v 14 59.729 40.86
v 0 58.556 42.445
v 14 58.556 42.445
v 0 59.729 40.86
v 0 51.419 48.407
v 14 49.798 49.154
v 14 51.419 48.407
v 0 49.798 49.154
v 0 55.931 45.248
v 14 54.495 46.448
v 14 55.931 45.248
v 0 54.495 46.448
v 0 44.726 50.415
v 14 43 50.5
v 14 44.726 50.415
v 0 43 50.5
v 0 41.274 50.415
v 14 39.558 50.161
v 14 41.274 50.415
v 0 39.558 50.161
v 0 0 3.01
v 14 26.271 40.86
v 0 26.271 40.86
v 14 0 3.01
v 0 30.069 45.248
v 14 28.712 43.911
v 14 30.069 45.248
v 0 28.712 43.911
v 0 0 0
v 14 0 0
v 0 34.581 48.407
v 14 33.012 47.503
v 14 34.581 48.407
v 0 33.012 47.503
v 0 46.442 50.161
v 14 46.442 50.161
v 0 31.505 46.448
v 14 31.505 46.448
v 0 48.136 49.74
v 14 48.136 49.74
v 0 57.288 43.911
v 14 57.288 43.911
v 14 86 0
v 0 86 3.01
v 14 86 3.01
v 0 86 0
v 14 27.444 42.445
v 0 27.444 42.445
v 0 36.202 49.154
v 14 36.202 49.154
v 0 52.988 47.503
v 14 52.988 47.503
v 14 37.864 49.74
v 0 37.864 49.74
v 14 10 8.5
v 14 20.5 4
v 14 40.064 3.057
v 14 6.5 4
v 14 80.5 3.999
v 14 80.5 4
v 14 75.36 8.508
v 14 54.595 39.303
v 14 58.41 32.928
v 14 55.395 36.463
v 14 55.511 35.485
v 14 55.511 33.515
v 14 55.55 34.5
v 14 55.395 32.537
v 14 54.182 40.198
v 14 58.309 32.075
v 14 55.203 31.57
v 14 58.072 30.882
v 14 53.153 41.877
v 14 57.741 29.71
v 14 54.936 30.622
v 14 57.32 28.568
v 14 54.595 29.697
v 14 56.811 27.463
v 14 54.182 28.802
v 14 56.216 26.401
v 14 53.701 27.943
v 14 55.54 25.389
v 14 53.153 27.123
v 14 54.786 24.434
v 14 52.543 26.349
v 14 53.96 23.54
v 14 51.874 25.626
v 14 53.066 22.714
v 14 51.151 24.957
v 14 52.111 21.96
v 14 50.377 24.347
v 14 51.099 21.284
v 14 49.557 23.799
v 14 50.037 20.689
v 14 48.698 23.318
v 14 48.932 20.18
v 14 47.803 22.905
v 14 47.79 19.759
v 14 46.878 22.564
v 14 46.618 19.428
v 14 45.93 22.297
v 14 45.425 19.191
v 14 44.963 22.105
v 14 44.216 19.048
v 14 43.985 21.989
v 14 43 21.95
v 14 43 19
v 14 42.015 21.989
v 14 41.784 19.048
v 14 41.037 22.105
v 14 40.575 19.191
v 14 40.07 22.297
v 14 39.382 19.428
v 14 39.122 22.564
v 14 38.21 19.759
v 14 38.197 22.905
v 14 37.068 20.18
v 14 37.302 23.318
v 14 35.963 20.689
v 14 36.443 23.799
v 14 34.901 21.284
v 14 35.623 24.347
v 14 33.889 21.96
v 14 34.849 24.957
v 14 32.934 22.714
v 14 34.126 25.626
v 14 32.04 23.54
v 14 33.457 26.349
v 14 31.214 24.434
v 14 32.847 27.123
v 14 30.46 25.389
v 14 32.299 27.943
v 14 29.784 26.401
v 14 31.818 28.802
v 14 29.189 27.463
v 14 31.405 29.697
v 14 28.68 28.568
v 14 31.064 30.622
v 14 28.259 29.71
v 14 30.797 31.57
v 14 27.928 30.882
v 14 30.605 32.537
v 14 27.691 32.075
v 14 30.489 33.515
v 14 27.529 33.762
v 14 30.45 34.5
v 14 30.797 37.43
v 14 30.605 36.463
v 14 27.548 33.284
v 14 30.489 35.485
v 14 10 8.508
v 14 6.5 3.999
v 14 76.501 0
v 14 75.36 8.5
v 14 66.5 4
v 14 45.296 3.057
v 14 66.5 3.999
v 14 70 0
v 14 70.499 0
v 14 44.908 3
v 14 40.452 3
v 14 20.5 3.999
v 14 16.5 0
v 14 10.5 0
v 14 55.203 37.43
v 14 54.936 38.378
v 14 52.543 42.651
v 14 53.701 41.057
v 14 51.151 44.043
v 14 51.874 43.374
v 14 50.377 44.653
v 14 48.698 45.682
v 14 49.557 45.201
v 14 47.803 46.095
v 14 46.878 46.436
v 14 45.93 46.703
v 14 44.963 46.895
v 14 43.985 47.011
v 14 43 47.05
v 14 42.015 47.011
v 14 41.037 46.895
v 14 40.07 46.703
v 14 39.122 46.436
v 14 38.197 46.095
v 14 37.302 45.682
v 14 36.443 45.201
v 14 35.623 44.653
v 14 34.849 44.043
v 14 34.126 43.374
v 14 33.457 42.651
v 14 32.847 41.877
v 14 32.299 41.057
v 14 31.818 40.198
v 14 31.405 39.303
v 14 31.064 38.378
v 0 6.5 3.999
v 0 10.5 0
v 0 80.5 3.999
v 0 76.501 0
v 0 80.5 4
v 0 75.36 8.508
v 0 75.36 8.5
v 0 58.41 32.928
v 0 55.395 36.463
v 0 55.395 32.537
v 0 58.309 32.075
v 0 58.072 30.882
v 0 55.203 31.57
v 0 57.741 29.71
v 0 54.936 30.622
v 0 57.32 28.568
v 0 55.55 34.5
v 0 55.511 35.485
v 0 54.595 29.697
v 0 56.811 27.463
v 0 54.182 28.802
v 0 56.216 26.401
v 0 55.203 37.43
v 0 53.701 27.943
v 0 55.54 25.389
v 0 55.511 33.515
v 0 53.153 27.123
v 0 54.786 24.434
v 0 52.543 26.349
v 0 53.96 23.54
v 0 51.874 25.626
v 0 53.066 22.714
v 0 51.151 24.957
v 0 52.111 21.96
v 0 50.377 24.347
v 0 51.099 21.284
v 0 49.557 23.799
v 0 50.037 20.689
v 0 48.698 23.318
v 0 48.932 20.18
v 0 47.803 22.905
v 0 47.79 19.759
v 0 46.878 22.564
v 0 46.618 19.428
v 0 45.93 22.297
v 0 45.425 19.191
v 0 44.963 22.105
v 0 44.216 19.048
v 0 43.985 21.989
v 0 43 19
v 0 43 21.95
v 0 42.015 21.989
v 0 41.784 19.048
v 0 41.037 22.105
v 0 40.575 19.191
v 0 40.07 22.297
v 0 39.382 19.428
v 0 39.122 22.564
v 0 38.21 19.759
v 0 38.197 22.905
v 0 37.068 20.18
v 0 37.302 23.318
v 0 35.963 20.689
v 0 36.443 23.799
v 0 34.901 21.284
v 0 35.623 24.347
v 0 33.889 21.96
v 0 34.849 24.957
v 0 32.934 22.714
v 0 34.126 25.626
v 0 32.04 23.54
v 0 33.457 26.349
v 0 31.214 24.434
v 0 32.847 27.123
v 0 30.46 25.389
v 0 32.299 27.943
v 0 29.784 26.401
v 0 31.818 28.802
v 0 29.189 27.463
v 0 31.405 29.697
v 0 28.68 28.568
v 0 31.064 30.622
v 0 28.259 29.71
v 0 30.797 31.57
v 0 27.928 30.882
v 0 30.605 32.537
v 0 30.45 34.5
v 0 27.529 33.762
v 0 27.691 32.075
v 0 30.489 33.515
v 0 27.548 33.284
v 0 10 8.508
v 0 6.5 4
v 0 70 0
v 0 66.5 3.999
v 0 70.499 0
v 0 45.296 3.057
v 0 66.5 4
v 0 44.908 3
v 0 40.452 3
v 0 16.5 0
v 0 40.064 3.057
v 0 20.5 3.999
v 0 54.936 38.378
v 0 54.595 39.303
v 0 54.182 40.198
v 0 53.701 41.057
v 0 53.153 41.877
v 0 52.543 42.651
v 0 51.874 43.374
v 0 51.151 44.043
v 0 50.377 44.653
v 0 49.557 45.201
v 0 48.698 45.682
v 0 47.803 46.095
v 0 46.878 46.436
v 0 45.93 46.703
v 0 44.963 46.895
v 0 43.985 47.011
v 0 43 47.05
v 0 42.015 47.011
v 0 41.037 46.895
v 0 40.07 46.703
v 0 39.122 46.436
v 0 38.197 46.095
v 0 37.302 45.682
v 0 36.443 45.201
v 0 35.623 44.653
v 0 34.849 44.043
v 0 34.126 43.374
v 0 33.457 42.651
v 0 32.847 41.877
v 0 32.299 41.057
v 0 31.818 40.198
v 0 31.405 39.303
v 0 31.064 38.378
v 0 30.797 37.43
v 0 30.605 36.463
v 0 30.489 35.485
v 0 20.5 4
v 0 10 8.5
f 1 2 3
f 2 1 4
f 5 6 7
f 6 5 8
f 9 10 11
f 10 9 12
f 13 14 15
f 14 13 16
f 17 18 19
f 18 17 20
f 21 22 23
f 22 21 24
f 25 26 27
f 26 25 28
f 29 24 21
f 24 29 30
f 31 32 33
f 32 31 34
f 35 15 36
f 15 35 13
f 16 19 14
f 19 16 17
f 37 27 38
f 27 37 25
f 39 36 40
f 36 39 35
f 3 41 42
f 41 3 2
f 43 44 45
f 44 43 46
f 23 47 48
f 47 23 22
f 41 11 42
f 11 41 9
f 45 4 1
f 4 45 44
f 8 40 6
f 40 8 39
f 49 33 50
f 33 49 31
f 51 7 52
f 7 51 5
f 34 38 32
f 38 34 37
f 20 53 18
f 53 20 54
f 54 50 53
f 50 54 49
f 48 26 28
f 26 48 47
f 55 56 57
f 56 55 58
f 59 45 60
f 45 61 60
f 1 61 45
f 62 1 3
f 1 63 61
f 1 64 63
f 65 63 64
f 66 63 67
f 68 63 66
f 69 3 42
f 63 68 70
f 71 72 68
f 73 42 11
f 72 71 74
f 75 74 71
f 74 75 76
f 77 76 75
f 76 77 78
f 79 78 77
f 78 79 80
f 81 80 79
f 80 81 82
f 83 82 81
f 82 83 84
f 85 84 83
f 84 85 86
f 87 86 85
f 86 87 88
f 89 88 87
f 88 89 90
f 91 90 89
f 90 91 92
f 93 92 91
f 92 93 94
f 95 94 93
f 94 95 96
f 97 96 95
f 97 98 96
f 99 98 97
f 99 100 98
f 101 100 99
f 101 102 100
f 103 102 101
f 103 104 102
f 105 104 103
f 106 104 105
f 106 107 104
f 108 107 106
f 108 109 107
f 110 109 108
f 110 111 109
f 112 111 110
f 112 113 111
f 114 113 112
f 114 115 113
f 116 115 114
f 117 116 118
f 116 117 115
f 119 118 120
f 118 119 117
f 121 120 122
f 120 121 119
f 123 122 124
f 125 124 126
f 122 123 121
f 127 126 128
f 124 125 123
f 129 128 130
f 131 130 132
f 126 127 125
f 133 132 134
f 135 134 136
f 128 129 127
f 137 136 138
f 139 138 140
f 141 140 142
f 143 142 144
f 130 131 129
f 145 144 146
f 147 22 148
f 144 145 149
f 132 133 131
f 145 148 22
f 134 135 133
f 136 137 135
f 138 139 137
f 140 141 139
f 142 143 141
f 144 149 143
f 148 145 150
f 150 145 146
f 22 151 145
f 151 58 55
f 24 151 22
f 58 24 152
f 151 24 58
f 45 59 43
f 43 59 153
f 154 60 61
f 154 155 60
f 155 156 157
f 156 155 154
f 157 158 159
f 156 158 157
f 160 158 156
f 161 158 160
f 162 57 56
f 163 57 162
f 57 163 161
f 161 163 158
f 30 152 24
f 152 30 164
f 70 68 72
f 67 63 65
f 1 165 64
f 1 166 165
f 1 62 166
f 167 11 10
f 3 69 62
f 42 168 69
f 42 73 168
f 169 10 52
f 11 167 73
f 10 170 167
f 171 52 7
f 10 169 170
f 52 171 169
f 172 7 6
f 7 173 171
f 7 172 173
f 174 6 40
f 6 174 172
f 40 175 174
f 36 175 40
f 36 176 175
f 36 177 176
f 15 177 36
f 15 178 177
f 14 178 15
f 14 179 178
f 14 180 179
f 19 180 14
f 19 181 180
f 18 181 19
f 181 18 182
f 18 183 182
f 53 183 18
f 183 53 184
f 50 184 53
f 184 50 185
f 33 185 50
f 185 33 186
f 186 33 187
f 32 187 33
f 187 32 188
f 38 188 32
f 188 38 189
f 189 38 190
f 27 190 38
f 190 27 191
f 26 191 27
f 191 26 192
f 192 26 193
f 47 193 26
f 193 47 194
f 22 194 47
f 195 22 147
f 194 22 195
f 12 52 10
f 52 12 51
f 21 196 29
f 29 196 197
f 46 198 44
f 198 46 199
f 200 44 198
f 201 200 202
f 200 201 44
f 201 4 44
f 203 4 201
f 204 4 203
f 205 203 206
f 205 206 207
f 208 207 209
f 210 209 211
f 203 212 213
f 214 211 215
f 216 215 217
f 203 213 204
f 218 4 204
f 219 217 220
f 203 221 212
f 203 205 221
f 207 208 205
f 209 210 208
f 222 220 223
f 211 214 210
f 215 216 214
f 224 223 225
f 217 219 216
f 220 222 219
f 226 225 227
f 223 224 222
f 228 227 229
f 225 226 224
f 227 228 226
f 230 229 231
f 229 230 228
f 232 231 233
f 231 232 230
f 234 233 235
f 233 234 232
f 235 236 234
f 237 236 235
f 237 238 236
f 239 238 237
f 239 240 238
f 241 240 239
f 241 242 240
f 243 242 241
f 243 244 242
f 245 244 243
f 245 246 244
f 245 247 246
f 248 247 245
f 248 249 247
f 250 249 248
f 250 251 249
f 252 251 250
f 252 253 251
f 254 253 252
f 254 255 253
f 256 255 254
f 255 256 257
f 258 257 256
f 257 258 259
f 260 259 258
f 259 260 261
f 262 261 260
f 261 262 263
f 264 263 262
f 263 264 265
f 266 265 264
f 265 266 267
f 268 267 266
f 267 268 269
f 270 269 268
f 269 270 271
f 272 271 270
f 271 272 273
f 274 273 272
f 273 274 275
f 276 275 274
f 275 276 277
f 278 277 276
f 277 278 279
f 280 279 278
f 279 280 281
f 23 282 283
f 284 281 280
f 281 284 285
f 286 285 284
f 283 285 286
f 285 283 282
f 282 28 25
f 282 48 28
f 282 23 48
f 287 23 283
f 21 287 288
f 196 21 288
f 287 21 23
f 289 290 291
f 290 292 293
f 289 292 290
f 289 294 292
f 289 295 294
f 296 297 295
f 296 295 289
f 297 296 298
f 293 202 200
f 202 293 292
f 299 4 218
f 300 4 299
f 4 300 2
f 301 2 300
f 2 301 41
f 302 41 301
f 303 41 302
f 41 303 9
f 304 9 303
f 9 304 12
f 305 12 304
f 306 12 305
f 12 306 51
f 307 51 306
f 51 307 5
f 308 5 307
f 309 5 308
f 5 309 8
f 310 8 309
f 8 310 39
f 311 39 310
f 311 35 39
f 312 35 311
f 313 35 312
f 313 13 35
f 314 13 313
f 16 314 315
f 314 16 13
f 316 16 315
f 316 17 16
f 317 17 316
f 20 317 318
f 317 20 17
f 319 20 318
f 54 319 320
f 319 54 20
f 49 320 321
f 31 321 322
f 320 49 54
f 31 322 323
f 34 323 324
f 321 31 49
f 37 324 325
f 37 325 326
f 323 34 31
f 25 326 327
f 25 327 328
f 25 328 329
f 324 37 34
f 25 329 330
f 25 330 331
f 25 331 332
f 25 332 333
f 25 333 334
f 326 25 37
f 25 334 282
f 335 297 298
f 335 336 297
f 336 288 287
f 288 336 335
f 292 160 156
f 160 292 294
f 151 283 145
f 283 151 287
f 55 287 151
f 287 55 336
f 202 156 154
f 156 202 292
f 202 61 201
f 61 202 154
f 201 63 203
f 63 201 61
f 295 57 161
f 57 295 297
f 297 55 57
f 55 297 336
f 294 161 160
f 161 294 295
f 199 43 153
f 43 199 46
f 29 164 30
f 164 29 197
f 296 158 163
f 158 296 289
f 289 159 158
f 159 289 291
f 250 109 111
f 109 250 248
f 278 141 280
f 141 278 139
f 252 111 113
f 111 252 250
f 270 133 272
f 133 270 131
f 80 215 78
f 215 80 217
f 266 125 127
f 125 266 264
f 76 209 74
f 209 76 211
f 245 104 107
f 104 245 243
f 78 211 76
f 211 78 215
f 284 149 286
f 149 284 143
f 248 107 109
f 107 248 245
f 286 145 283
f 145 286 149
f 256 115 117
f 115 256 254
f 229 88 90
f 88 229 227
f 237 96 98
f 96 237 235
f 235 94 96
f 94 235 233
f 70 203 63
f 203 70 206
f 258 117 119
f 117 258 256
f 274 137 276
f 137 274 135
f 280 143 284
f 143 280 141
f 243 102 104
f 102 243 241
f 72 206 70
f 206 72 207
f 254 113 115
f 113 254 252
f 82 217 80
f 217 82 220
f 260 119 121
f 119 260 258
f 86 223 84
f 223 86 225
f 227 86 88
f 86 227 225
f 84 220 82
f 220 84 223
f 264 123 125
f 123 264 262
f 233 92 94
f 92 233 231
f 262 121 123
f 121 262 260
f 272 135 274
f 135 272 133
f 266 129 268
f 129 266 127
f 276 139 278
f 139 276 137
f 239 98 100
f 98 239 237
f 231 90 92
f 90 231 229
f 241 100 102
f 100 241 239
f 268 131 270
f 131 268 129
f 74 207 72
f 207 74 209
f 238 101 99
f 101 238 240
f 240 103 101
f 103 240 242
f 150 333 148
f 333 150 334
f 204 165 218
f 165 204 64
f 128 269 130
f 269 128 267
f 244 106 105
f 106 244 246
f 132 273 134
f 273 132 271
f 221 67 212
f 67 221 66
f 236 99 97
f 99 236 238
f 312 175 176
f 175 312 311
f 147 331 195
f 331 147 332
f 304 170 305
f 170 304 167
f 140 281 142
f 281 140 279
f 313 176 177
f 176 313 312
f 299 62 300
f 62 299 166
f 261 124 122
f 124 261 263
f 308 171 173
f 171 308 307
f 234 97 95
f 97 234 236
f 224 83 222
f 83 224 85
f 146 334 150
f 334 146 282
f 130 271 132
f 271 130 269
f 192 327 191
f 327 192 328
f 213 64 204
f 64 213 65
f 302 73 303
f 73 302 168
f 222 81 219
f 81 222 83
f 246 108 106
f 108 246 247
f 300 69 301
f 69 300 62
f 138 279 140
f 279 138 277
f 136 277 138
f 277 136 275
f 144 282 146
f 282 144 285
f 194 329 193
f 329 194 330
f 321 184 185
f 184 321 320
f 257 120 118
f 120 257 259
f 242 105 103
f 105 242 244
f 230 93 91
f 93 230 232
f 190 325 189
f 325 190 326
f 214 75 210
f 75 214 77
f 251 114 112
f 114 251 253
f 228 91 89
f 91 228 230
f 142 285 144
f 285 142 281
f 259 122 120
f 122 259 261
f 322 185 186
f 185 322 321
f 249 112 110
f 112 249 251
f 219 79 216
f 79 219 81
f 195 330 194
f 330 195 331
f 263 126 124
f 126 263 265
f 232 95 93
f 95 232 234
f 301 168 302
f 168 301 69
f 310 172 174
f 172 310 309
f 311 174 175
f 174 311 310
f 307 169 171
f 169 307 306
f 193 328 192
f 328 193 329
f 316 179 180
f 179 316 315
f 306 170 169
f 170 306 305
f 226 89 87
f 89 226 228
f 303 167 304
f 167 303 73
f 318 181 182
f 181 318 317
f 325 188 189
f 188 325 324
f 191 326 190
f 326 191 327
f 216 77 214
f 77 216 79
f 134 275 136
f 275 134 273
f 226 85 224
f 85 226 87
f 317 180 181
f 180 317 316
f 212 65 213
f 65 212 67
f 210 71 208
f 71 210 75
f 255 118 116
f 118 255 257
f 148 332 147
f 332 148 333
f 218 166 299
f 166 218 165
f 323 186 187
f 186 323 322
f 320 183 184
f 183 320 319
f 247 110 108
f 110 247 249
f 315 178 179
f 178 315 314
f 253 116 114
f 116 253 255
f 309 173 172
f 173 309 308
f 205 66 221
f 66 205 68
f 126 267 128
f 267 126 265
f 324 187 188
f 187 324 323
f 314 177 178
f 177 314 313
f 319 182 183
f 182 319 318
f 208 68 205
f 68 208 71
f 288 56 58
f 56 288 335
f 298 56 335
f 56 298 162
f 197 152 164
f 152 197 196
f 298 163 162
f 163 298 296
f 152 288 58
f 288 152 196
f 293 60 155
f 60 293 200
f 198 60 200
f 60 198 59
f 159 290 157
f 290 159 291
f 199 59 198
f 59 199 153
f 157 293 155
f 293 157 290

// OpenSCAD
$fn=80;

module pcTop() {
    cube([370,86,2]);
    
    translate([7,13.5,2]) cylinder(d=3.5,h=4);
    translate([7,13.5+60,2]) cylinder(d=3.5,h=4);
    
    translate([370-31,13.5,2]) cylinder(d=3.5,h=4);
    translate([370-31,13.5+60,2]) cylinder(d=3.5,h=4);
        
}

module tube() {
    translate([0,86/2,22+(25/2)]) rotate([0,90,0]) cylinder(d=25.1,h=345);
}

module handle() {
    module body() {
        hull() {
            cube([14,86,0.01]);
            translate([0,86/2,20]) rotate([0,90,0]) scale([1,0.8,1]) cylinder(d=55,h=14);
        }
    }
    
    module bodyFrame() {  
        cube([14,86,3]);
        
        translate([0,0,3]) difference() {
            body();
            translate([-0.01,10,5.5]) scale([1.01,0.76,0.76]) body();
        }
    }
    
    difference() {
        union() {
            bodyFrame();
            translate([0,86/2,22+(25/2)]) rotate([0,90,0]) cylinder(d=25+6,h=14);
        }
        
        translate([-0.001,0,0]) tube();
        
        translate([-10,-10,-10]) cube([80,80,10]); // flatten the bottom
        
        hull() translate([7,13.5,0]) cleat();
        hull() translate([7,13.5+60,0]) cleat();
    }
}

module cleat() {
    module cleatBody() {
        hull() {
            cube([14,6,0.001], center=true);
            translate([0,0,4]) cube([14,14,0.001], center=true);
        }
    }
    
    difference() {
        cleatBody();
        translate([0,0,-1.45]) screwClearance();
    }
}


module screwClearance() {
    cylinder(d=3.5+0.1,h=3.7);
    translate([0,0,3.7]) cylinder(d=7+0.1,h=1.6+0.2);
}

handle();
//cleat();

%tube();
%translate([0,0,-2]) pcTop();
%translate([332,0,0]) handle();

//part: handle();
//part: cleat();
